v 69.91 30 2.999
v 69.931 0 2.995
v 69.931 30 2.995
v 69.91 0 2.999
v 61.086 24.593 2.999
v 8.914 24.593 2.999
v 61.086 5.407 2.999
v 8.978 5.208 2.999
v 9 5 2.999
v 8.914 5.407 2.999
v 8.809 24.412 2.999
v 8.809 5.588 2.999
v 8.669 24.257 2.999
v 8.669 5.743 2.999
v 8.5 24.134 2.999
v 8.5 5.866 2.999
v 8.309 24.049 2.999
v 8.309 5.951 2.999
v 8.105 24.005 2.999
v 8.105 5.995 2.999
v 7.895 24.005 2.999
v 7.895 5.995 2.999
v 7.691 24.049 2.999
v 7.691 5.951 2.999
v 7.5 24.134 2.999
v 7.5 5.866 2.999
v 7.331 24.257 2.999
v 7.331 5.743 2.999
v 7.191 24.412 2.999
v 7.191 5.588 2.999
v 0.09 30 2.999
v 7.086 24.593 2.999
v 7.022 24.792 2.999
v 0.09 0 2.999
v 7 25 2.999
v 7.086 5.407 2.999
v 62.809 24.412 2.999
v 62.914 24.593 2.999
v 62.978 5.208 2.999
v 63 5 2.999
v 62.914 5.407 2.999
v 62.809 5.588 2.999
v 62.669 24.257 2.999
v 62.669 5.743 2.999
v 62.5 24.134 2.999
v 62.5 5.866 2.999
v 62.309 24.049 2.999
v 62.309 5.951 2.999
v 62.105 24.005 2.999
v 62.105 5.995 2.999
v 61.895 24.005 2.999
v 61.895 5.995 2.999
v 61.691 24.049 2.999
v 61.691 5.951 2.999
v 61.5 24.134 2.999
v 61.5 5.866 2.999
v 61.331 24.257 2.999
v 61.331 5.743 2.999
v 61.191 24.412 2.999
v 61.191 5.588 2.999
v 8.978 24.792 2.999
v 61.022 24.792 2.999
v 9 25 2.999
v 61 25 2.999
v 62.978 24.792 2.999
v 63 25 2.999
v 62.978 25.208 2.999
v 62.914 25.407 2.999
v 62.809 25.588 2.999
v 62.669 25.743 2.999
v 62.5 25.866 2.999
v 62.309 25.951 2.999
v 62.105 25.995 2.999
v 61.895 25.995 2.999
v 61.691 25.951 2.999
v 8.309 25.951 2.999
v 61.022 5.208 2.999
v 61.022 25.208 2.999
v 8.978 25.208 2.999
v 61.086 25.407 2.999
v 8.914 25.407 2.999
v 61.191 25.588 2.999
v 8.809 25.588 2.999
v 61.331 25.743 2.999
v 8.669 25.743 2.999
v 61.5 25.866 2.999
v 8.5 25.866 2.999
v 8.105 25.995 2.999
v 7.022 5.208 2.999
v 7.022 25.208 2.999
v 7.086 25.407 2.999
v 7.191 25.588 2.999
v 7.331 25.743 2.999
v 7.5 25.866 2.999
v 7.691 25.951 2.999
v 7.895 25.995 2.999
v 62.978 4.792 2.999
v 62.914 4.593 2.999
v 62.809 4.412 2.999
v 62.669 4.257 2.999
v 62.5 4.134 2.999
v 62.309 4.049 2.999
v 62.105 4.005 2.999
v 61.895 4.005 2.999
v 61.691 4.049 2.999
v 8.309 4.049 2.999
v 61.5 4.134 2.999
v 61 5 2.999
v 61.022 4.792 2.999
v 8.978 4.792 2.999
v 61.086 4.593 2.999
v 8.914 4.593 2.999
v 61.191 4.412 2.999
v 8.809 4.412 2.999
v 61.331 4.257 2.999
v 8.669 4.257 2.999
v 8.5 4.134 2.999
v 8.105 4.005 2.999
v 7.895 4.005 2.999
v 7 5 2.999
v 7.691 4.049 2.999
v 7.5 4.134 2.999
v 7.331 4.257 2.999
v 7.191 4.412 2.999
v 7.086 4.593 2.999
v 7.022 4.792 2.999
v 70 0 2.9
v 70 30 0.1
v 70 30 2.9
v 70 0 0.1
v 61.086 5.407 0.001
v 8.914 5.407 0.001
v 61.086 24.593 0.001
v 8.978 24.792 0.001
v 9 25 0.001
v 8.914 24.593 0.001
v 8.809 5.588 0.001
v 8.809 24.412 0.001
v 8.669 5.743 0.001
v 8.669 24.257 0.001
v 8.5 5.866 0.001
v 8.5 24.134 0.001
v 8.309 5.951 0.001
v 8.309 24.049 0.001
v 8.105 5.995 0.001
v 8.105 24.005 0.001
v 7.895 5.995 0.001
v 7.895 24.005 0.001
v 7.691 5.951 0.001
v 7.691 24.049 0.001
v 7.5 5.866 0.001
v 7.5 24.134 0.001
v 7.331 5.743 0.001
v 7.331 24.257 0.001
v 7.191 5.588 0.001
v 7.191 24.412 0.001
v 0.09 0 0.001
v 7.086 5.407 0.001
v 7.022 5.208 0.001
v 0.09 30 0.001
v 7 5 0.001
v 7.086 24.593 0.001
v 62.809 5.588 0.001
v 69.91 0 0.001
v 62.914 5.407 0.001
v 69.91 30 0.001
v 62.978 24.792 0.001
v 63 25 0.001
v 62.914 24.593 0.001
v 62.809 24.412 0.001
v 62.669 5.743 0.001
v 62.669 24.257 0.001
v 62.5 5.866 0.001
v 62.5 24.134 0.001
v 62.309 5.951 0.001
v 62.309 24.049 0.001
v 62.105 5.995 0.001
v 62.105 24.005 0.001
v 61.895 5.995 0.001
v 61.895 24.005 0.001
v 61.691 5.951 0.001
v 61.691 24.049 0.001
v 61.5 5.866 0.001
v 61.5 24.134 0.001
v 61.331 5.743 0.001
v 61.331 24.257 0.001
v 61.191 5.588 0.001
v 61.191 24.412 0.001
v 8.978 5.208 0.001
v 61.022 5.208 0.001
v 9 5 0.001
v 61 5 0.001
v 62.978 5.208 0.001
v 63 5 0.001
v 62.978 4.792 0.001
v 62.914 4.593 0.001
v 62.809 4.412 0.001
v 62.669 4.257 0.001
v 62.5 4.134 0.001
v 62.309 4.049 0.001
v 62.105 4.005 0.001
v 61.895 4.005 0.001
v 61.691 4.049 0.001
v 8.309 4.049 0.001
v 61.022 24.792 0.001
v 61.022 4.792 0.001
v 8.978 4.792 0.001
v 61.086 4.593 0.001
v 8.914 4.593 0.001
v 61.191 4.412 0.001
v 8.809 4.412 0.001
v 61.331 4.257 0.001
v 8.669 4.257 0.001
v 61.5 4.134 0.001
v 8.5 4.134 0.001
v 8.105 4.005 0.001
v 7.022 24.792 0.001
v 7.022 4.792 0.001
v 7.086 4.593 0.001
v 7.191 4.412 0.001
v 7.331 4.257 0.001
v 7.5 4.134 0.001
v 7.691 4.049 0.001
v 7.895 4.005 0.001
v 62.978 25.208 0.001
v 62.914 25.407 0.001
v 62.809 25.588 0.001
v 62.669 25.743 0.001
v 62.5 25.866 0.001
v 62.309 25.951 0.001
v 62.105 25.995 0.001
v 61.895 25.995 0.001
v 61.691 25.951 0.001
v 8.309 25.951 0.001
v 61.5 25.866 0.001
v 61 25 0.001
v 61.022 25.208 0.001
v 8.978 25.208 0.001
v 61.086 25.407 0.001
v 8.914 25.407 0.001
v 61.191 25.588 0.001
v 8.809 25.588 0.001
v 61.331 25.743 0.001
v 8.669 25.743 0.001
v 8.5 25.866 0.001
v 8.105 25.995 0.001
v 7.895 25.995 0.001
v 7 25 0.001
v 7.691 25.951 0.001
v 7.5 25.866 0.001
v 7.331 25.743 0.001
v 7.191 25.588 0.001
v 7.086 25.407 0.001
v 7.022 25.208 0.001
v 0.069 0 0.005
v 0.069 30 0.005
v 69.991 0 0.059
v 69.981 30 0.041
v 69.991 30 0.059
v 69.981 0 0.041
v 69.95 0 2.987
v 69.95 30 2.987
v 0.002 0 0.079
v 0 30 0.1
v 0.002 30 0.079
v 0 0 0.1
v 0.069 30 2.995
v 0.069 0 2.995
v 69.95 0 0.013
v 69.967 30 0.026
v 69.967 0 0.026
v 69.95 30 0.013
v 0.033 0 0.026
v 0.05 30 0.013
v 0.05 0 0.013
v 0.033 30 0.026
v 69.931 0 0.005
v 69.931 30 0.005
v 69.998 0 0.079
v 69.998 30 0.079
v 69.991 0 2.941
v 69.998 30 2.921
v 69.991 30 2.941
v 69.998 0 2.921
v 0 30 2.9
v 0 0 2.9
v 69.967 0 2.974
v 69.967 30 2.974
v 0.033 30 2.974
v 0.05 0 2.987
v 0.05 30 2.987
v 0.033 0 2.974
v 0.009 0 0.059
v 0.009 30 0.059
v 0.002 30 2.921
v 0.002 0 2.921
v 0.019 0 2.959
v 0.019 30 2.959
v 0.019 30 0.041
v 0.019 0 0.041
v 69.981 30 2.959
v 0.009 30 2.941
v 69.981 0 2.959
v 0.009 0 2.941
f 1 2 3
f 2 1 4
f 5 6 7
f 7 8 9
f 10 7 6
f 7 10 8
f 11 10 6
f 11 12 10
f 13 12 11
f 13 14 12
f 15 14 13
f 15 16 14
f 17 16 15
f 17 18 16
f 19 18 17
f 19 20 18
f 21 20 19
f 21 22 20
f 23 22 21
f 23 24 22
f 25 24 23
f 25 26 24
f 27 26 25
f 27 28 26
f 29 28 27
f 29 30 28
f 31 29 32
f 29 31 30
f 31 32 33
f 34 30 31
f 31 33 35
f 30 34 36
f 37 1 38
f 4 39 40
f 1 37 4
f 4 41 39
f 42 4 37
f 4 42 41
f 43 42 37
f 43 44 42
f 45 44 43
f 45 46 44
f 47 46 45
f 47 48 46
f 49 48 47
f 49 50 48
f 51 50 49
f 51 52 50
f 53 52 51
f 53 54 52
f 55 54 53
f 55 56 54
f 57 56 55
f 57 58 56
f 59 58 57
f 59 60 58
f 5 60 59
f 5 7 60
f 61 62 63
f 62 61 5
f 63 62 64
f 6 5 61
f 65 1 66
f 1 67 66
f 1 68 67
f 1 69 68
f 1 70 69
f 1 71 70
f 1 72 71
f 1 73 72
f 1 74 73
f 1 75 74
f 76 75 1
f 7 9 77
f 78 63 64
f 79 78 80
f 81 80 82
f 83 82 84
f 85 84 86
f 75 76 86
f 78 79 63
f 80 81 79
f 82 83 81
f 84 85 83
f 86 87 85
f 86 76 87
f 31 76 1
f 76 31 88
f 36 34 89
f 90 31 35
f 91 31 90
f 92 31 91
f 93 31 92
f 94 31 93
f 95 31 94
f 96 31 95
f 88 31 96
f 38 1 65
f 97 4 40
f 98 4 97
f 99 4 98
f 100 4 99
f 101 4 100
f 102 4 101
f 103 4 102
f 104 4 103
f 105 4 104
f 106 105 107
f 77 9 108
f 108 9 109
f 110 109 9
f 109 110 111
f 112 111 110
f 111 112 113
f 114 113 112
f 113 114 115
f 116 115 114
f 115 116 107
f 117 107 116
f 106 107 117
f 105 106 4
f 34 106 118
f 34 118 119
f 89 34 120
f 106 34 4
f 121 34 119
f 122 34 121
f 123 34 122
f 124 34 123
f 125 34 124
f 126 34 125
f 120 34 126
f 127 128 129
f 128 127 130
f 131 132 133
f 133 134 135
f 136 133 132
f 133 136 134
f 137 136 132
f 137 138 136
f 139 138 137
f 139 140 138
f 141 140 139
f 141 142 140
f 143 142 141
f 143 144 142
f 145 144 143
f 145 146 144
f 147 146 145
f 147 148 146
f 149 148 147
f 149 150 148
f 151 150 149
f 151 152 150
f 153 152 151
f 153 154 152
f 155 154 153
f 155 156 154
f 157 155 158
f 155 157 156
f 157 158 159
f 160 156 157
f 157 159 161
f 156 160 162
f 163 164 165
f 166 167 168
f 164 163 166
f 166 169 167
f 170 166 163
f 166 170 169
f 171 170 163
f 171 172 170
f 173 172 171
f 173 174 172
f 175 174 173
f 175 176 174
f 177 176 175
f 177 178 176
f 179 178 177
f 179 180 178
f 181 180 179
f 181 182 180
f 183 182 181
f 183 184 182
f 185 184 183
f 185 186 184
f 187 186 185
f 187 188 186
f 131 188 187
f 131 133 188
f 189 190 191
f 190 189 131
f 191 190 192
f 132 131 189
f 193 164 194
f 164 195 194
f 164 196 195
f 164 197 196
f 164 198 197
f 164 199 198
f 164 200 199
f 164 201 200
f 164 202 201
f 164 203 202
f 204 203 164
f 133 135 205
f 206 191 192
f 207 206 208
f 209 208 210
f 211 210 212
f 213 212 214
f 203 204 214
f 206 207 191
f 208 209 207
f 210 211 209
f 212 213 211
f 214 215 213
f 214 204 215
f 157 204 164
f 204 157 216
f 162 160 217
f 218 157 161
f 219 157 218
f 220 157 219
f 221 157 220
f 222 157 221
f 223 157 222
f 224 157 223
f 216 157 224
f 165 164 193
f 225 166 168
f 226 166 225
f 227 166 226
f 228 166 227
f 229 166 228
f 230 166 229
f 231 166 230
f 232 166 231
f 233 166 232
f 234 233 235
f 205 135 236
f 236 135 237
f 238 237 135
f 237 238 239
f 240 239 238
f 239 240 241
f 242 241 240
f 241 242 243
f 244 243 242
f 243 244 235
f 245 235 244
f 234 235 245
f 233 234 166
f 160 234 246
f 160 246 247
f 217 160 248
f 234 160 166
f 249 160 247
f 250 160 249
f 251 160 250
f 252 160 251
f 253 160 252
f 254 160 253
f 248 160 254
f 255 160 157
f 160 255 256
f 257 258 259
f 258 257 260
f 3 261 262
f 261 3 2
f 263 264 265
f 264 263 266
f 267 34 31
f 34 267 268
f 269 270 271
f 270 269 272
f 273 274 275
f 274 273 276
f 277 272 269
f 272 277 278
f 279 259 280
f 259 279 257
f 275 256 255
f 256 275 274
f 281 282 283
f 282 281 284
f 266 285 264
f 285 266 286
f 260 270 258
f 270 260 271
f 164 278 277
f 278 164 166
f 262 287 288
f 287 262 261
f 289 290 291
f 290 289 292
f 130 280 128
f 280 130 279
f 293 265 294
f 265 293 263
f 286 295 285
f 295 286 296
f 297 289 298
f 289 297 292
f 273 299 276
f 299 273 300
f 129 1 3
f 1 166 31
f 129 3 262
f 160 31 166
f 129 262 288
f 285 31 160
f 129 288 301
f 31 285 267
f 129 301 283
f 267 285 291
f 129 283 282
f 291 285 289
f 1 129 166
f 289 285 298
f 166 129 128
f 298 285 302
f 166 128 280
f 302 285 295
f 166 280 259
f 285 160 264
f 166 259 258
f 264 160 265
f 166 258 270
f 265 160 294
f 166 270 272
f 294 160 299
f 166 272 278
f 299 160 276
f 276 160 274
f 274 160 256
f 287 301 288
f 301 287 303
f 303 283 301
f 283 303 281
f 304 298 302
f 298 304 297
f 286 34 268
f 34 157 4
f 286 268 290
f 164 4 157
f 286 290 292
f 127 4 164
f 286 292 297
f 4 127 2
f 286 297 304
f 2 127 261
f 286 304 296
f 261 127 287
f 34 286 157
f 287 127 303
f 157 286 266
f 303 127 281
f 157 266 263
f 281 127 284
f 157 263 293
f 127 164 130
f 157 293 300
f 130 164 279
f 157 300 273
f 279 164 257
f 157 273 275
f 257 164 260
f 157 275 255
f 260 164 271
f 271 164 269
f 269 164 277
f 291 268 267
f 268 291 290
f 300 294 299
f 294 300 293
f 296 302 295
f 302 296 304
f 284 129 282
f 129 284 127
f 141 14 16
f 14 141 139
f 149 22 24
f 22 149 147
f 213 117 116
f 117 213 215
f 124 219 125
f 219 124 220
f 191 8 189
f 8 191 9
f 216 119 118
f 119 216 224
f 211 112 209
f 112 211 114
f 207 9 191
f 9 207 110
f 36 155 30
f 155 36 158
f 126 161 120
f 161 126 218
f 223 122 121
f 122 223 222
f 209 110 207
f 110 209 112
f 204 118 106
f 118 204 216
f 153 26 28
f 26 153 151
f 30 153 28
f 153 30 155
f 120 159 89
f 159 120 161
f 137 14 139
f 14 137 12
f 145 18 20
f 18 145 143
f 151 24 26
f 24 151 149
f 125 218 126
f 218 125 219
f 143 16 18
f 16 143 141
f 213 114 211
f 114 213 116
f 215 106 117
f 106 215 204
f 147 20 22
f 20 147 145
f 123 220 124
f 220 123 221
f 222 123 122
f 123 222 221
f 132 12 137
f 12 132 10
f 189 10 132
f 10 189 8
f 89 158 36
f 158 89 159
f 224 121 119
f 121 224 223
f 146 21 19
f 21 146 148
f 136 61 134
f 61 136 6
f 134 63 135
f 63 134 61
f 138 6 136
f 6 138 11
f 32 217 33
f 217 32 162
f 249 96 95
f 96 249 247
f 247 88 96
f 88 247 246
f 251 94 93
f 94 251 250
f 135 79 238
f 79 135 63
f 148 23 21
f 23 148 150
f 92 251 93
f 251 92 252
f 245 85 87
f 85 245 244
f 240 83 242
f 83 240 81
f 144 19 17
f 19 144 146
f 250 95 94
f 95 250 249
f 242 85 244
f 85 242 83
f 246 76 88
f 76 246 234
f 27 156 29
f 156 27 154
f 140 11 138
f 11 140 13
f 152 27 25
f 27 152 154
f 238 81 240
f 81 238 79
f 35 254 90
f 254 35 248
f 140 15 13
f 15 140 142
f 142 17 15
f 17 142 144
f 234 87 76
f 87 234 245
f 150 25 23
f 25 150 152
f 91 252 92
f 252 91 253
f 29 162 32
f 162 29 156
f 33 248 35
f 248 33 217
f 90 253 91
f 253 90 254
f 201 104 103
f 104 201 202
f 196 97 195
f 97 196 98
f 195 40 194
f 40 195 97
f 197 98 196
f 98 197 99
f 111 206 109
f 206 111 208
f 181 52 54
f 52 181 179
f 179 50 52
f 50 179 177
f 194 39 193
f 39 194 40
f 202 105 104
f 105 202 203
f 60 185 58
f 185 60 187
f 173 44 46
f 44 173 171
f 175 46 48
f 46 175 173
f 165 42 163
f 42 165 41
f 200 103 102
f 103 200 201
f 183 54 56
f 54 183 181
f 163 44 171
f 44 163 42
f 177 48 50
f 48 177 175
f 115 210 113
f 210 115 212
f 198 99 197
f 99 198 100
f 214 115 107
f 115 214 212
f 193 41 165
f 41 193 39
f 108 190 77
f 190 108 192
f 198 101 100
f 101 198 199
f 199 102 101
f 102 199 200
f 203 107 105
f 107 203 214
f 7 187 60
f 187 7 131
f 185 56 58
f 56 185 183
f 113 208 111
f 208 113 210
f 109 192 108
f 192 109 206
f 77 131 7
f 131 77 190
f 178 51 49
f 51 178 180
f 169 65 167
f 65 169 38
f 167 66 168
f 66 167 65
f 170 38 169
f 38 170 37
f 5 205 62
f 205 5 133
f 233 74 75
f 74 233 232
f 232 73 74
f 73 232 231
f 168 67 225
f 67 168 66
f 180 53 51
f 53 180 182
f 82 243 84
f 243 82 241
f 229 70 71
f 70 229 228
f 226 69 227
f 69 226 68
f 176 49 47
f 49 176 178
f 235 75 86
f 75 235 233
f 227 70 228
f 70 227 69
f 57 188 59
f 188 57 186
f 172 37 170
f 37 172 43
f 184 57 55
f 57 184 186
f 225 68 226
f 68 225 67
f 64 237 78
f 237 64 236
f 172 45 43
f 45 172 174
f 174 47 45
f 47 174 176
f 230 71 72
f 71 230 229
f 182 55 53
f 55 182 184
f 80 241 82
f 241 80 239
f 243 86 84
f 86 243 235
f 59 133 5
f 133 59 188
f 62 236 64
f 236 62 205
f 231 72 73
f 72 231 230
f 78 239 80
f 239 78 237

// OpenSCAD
height=30;
$fn=30;

translate([0,0,3]) rotate([-90,0,0]) body();

module body(hole=2) {
   width=70;
   length=3;
   rad=0.1;

   difference() {
      hull() {
         translate([0+rad,0+rad,0]) cylinder(r=rad,h=height);
         translate([width-rad,0+rad,0]) cylinder(r=rad,h=height);
         translate([width-rad,length-rad,0]) cylinder(r=rad,h=height);
         translate([0+rad,length-rad,0]) cylinder(r=rad,h=height);
      }

      /* heat set inserts */
      translate([8,-0.1,5]) rotate([-90,0,0]) cylinder (d=hole, h=6.9);
      translate([8,-0.1,height-5]) rotate([-90,0,0]) cylinder (d=hole, h=6.9);
      translate([width-8,-0.1,5]) rotate([-90,0,0]) cylinder (d=hole, h=6.9);
      translate([width-8,-0.1,height-5]) rotate([-90,0,0]) cylinder (d=hole, h=6.9);
   }
}
